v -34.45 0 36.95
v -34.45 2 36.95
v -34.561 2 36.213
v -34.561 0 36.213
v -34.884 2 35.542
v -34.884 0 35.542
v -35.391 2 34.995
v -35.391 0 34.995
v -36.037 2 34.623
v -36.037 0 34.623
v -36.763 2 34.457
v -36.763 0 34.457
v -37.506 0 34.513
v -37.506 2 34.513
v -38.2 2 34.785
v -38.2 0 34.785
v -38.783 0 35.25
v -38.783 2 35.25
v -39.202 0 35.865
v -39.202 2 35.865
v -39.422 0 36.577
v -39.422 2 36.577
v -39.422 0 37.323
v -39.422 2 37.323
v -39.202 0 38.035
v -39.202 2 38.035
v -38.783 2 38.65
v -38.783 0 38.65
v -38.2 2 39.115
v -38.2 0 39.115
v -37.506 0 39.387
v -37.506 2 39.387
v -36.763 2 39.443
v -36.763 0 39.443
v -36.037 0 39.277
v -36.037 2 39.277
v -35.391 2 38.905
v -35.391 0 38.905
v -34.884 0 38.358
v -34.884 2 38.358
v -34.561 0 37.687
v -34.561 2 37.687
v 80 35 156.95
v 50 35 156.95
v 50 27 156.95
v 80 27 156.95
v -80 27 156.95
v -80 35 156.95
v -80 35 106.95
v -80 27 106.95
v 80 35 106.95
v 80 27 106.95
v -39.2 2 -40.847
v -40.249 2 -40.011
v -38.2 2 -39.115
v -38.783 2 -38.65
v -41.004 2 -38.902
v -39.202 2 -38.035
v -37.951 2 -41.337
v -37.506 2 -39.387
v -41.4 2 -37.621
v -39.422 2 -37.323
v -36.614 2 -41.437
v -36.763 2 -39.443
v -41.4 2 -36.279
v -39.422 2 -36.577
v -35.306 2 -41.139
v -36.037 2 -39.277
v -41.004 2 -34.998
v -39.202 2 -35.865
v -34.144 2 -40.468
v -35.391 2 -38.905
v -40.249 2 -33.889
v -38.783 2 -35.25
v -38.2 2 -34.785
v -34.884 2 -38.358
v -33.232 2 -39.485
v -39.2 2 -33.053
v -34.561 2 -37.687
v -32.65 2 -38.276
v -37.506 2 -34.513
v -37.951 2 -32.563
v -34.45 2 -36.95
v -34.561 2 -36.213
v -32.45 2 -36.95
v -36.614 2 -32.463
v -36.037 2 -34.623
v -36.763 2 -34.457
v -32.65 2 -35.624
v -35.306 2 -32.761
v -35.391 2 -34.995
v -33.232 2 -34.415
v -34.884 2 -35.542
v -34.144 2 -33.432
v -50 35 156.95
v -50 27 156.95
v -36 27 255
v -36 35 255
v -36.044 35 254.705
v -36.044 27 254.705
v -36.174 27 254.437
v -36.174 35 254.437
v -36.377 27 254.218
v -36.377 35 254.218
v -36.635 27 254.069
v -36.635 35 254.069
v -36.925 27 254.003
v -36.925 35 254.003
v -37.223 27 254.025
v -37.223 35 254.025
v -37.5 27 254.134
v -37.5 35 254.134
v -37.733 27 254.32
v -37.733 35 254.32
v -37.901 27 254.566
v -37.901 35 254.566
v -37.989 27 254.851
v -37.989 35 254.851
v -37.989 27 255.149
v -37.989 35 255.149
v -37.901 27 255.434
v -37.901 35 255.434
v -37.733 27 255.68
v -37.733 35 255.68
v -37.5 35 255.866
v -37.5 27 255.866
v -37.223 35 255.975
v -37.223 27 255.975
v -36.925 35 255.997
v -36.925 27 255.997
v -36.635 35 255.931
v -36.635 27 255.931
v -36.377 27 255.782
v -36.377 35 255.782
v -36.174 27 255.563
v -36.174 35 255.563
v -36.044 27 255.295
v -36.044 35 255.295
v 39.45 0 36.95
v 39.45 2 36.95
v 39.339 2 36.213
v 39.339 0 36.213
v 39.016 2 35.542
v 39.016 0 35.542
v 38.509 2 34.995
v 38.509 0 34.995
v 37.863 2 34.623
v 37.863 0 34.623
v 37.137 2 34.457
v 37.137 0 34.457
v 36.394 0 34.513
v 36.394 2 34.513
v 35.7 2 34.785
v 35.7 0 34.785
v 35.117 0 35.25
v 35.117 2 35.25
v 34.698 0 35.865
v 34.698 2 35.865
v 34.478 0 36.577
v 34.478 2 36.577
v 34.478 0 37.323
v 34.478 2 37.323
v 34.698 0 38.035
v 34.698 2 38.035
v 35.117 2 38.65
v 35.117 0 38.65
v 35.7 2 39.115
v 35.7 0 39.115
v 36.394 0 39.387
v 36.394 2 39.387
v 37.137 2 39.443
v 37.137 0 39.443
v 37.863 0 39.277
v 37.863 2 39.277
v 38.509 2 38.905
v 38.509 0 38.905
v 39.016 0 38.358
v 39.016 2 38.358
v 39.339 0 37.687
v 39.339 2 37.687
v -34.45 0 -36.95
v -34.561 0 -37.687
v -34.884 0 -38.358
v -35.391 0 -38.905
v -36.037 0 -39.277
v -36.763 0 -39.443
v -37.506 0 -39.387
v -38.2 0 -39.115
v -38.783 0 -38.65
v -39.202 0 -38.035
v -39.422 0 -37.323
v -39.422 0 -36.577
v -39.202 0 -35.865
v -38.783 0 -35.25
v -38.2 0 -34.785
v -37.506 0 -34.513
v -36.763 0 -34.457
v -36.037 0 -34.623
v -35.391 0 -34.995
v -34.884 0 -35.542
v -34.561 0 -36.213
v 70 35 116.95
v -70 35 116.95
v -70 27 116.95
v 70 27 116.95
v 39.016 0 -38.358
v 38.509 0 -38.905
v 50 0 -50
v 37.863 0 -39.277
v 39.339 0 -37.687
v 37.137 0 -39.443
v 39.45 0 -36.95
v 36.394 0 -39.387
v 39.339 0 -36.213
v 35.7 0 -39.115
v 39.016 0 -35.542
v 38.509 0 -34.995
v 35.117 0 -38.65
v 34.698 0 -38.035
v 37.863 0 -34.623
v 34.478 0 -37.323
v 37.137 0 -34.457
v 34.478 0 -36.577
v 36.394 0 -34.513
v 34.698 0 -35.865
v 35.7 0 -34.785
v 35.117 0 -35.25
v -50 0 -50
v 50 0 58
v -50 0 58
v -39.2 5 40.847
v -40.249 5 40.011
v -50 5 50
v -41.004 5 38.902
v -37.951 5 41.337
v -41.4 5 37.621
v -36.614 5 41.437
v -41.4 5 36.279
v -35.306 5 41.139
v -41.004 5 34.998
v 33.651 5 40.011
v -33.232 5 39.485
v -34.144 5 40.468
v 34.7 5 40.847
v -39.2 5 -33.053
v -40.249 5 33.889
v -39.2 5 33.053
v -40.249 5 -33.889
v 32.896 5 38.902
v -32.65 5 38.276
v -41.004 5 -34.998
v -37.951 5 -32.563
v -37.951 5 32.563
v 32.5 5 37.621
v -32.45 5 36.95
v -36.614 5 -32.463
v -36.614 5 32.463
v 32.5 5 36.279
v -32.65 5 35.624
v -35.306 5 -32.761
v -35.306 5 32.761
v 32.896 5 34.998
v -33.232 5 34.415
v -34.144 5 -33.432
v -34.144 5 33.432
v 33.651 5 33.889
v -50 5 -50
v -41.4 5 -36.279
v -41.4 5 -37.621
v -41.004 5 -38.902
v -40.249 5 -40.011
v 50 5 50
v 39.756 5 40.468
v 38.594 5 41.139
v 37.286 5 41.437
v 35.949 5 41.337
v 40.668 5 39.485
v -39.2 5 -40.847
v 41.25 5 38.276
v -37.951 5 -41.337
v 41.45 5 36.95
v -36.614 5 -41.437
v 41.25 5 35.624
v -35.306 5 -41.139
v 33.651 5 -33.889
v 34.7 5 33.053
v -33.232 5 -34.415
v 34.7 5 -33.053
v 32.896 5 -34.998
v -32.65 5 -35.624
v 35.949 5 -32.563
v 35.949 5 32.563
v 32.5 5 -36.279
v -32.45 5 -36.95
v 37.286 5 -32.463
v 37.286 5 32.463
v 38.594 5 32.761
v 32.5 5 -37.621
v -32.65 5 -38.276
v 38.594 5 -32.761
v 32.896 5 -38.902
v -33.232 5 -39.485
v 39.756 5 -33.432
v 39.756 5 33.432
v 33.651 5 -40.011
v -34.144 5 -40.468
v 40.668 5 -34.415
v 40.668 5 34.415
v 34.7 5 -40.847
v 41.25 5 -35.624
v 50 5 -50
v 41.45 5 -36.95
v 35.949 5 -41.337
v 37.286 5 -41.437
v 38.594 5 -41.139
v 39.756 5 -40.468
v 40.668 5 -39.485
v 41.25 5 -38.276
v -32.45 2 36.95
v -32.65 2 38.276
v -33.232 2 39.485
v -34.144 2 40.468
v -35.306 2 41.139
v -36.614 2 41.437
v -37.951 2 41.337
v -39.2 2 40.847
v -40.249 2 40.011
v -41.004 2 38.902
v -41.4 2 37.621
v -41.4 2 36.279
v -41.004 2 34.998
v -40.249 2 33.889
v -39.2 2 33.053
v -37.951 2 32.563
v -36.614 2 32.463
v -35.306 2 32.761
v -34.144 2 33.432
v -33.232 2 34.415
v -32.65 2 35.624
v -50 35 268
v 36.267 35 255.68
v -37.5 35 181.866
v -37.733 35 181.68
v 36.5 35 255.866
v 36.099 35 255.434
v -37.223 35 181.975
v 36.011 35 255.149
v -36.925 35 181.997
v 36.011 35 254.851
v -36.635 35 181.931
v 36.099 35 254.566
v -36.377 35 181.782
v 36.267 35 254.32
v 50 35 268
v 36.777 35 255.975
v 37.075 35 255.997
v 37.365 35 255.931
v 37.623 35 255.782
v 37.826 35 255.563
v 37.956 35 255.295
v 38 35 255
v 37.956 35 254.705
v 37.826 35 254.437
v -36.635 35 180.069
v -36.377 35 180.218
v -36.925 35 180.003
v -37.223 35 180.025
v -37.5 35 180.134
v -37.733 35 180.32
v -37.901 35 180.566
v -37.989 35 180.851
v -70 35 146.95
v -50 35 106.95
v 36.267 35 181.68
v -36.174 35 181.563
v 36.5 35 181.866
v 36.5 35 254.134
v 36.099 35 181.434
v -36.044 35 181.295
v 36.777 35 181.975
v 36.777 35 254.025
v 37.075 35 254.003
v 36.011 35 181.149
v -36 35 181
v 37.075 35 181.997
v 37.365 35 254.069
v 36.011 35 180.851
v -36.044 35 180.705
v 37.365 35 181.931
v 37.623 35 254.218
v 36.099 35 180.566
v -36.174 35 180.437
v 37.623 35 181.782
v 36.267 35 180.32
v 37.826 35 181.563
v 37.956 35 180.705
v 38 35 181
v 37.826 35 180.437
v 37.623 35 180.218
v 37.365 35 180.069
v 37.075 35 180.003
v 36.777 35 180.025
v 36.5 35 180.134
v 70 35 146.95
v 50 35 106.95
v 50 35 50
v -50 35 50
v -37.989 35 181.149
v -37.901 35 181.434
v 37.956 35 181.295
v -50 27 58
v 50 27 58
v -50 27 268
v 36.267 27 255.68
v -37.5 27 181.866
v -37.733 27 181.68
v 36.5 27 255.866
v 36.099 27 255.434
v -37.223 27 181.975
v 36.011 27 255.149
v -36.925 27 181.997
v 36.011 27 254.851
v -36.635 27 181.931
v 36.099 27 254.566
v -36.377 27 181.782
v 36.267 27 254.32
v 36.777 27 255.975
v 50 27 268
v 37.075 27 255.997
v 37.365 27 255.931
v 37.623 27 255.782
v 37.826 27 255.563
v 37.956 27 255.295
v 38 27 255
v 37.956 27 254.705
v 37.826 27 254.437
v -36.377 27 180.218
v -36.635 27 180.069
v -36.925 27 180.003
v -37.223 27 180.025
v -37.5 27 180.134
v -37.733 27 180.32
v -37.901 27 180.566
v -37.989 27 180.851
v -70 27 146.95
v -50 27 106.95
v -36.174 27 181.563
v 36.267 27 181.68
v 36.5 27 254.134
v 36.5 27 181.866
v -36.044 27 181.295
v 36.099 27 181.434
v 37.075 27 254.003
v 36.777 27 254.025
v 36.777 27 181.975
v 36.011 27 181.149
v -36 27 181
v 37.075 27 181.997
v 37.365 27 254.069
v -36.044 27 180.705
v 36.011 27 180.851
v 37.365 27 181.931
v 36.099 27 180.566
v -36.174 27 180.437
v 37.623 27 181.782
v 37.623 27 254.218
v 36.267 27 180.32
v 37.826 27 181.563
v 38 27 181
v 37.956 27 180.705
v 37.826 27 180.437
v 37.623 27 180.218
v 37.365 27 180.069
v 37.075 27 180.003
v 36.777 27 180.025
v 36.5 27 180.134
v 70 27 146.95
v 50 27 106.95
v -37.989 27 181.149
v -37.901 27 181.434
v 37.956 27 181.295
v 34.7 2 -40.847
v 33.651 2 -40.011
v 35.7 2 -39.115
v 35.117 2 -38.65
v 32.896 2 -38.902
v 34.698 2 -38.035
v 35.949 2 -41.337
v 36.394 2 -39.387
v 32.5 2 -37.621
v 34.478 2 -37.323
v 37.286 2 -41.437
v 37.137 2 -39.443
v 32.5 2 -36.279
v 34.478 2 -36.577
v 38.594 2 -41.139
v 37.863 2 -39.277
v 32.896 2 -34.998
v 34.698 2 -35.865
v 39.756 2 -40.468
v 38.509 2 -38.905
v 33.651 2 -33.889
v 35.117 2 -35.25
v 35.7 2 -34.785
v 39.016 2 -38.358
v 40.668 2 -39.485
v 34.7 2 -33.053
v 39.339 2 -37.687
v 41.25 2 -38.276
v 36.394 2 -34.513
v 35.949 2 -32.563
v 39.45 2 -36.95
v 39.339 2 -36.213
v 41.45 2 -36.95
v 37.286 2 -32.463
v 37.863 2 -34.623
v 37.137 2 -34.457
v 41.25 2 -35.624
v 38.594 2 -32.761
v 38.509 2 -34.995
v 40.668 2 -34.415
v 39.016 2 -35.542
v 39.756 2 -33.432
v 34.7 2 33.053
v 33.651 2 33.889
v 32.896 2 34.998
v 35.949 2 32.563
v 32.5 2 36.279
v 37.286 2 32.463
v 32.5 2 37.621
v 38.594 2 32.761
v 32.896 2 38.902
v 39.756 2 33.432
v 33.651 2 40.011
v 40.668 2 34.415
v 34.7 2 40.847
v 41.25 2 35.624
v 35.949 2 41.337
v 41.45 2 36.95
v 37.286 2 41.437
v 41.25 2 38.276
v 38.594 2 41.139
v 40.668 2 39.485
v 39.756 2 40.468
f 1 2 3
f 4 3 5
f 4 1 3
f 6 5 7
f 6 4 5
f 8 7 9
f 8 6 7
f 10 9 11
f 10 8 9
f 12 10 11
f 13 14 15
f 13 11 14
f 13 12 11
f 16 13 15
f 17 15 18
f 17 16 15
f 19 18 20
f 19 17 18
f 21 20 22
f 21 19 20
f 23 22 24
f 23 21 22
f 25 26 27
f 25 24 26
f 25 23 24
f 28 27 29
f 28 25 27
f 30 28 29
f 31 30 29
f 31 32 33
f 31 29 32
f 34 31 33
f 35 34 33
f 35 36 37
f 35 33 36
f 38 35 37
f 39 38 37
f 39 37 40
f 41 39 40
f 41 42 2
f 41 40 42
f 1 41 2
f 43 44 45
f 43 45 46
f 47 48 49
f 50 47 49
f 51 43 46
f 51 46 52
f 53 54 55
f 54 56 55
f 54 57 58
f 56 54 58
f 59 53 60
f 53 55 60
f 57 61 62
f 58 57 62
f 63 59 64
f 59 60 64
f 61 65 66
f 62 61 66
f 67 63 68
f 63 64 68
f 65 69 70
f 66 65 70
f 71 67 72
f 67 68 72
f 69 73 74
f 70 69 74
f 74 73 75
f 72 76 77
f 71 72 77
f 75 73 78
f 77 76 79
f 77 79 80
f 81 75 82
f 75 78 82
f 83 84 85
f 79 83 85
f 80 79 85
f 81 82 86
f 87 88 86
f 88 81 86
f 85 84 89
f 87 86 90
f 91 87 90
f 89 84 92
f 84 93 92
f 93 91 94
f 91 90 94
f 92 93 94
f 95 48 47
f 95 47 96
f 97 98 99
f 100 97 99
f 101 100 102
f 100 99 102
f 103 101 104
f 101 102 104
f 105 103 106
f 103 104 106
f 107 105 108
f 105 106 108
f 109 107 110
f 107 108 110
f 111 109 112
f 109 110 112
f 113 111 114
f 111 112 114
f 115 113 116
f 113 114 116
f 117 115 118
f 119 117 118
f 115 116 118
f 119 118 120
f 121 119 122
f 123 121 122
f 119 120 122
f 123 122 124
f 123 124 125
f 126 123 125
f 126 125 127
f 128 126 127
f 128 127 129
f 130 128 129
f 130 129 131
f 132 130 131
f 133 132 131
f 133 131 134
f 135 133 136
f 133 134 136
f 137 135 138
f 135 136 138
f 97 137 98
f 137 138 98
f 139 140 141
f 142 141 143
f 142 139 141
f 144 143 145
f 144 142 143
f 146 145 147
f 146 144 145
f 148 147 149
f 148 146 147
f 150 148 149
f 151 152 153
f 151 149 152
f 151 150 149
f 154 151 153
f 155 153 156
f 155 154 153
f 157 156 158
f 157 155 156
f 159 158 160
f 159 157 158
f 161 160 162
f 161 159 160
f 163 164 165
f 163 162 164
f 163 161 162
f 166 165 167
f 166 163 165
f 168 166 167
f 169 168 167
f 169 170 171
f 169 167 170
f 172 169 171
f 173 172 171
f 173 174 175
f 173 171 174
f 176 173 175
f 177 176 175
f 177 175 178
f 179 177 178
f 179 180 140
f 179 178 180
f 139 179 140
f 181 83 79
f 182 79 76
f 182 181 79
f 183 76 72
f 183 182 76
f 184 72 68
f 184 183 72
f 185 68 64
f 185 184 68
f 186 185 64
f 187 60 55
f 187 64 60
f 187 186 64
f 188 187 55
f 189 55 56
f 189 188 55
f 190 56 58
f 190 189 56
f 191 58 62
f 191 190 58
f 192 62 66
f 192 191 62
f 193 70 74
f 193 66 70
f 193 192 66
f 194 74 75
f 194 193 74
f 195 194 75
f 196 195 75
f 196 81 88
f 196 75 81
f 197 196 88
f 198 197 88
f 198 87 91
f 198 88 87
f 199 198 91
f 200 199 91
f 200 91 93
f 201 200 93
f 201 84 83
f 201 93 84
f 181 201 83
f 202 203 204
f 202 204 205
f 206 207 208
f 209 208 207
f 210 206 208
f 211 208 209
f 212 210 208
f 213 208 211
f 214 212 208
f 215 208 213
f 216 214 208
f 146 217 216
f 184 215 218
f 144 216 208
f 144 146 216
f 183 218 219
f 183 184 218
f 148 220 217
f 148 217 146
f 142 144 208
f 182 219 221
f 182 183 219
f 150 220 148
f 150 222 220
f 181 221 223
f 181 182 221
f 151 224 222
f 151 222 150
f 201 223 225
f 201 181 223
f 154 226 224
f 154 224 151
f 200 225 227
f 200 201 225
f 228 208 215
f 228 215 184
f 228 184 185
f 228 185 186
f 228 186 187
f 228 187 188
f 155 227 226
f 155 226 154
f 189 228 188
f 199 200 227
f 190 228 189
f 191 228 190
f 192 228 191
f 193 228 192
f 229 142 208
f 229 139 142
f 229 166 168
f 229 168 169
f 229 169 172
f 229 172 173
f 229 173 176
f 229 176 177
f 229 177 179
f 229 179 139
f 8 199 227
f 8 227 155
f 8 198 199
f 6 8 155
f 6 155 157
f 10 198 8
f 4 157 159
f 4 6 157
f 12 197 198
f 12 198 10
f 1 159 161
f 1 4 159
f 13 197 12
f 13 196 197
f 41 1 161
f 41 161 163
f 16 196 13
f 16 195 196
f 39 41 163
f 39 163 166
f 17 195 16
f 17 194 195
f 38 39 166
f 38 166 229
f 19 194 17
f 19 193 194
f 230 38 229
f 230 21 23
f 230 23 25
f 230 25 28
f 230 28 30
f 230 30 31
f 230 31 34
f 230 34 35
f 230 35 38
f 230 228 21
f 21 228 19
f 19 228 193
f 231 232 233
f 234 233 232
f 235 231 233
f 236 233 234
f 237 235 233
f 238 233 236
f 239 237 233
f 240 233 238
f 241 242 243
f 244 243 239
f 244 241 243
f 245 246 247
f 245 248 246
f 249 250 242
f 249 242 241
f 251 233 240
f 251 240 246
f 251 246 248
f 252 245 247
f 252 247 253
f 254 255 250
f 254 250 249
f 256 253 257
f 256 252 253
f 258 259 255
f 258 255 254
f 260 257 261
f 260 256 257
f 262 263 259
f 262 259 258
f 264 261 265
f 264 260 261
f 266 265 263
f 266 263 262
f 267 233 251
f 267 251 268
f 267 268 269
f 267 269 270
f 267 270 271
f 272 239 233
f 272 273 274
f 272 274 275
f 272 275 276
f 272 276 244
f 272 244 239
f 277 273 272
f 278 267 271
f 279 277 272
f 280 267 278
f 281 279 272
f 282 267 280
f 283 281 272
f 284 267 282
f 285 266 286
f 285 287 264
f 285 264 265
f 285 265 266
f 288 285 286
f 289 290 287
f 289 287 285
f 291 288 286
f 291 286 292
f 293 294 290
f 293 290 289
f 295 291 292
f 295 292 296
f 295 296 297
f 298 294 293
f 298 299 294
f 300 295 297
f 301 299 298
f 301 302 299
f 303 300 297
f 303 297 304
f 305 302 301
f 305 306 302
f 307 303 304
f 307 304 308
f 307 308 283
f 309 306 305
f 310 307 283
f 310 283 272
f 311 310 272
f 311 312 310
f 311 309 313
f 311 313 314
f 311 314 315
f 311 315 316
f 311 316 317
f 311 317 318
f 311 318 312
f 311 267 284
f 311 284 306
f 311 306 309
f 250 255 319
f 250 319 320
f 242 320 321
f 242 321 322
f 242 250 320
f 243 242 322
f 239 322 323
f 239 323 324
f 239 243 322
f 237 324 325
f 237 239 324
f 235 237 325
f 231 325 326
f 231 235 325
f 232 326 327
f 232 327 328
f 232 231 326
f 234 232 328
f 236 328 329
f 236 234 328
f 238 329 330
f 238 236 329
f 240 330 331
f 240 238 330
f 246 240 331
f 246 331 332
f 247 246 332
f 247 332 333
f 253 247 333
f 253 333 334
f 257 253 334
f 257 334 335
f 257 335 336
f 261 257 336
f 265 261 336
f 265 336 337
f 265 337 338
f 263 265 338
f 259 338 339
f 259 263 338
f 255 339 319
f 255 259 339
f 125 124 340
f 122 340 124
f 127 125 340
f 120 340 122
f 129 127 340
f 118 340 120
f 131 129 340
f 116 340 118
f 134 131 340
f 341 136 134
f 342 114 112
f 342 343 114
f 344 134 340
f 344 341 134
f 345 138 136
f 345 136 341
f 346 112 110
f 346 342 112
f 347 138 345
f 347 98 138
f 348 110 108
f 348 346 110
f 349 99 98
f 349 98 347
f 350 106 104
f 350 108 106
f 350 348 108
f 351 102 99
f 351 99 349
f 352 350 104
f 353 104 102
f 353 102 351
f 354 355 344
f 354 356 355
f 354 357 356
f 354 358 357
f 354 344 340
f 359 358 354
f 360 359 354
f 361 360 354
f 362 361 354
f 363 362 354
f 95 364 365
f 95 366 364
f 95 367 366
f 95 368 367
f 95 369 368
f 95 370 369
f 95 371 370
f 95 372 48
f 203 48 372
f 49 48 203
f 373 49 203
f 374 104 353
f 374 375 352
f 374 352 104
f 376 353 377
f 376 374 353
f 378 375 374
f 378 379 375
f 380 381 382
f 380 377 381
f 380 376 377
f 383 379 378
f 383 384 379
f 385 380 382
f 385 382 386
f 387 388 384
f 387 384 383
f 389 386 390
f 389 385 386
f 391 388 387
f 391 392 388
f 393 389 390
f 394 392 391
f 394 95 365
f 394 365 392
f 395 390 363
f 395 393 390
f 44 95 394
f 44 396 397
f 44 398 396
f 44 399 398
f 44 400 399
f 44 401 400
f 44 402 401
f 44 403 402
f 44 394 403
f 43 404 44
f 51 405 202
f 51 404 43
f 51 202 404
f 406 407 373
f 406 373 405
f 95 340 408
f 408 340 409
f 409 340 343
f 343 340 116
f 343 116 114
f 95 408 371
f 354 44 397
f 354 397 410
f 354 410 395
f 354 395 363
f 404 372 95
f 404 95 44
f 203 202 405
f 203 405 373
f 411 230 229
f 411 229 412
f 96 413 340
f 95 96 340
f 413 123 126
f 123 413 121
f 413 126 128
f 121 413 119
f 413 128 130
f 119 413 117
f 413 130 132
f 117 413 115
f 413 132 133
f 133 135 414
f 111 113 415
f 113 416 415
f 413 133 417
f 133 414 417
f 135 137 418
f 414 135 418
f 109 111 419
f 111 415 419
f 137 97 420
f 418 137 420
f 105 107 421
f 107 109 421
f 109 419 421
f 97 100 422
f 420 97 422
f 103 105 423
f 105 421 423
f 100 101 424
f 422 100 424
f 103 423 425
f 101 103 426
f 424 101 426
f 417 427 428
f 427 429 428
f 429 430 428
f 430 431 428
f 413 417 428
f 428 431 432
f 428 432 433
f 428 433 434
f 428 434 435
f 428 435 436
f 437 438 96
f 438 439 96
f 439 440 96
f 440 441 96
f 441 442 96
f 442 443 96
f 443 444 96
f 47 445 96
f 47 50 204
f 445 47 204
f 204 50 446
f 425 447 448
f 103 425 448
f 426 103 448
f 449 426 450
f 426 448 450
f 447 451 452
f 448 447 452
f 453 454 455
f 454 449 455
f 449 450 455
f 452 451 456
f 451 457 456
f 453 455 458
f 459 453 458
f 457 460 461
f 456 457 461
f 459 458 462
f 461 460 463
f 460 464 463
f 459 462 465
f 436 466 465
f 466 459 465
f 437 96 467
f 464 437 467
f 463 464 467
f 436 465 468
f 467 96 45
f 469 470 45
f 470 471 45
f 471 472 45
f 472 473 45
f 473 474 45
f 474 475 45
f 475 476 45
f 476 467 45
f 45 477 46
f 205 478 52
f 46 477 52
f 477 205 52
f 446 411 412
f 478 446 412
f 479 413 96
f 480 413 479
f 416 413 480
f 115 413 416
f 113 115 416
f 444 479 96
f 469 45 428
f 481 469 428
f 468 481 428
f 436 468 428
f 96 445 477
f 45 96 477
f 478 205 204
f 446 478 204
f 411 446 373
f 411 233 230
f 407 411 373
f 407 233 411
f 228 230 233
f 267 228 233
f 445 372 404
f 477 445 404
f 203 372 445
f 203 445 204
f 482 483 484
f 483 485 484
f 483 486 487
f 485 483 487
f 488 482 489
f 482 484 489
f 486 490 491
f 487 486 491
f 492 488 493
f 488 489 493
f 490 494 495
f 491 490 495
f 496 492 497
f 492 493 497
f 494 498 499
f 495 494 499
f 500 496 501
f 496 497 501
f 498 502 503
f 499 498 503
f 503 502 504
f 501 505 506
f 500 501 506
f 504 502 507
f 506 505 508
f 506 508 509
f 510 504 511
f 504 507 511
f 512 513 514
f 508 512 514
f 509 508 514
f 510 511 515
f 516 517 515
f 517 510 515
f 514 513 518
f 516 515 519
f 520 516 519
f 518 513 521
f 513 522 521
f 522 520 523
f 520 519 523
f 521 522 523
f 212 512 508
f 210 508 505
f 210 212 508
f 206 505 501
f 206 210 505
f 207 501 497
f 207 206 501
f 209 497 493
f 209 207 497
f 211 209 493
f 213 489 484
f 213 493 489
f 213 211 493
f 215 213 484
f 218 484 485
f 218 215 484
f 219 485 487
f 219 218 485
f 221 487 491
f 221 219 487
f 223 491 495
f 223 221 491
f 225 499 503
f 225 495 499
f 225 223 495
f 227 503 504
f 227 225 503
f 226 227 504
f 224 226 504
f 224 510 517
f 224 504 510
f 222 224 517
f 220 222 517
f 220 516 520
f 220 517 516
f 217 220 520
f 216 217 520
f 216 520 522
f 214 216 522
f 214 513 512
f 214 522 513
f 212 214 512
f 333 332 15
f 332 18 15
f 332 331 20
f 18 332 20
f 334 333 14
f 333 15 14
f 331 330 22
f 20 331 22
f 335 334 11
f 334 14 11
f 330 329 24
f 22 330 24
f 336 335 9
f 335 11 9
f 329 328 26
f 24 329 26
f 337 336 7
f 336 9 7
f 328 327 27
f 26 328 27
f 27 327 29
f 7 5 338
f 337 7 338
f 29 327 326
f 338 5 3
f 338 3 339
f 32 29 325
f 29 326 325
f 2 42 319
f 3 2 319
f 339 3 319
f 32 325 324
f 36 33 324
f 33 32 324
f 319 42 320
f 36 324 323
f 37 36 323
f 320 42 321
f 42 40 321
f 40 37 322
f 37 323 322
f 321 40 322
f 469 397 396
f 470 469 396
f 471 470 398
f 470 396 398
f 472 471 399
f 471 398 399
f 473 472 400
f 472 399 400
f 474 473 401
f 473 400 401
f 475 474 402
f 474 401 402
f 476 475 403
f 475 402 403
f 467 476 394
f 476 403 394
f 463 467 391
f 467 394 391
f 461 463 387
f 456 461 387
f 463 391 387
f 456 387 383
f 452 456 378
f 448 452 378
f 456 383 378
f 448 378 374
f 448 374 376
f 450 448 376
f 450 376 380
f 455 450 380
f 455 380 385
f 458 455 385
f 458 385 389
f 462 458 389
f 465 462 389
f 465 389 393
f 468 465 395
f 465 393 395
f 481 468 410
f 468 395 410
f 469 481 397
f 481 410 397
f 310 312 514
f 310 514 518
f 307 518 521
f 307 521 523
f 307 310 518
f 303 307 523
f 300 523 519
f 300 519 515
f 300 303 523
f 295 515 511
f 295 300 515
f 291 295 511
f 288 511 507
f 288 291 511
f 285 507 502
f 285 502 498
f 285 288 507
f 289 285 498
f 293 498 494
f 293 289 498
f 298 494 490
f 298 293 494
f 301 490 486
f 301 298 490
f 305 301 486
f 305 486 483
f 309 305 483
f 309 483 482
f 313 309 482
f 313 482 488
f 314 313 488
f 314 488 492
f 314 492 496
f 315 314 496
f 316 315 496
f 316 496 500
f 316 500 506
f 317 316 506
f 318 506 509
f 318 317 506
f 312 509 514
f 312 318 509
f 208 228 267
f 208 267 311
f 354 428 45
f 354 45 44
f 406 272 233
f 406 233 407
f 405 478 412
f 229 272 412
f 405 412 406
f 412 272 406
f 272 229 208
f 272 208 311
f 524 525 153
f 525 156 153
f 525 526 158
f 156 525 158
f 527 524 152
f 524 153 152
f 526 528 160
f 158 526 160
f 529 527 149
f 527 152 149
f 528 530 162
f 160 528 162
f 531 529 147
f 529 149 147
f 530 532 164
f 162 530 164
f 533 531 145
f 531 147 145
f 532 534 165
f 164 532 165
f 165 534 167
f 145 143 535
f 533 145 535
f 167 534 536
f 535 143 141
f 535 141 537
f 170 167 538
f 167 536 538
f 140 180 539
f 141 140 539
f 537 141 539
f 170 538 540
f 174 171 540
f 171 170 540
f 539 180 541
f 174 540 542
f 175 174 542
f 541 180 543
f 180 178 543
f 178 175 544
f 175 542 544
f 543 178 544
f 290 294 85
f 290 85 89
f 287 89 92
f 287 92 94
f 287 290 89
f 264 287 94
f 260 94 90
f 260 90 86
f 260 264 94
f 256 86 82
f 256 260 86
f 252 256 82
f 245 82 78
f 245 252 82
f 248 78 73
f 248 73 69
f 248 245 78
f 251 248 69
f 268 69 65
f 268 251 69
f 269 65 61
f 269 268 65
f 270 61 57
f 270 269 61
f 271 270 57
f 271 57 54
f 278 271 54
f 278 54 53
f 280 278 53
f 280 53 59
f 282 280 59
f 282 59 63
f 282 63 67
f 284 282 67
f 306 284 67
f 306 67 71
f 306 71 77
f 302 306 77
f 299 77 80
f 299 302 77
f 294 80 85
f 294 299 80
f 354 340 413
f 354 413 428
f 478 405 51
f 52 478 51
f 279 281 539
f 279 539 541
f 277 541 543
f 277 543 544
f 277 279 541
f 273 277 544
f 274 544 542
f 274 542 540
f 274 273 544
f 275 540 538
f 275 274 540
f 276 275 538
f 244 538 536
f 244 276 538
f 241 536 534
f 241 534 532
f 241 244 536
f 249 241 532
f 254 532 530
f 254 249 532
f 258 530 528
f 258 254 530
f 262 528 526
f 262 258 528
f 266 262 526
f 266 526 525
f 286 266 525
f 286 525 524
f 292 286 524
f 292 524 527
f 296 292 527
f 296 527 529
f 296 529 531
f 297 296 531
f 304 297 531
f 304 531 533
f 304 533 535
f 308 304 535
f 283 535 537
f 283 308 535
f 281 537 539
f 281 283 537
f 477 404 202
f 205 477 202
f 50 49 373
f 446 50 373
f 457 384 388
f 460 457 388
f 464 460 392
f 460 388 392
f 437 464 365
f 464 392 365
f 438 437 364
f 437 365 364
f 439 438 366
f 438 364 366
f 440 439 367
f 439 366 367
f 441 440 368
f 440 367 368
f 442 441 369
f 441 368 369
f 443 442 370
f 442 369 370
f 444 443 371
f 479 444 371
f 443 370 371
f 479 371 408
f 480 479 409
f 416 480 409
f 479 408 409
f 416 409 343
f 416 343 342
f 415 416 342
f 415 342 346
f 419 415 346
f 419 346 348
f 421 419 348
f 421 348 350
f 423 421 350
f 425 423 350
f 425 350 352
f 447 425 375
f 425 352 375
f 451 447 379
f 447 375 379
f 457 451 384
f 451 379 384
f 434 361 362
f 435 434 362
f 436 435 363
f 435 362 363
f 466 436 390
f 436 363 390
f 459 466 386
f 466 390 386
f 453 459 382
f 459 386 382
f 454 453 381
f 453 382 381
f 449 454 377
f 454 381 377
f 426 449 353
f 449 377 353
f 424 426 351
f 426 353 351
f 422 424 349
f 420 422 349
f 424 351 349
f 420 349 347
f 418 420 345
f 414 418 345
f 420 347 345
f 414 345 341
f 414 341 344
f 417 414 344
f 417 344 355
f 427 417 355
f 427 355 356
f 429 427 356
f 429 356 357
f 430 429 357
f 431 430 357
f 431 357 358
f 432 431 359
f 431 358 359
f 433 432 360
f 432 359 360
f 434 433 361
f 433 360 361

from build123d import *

# Parameters (mm, degrees)
SKETCH1_W           = 100
SKETCH1_H           = 100
SKETCH1_R           = 2.5
BOSS_EXTRUDE1_DEPTH = 5
CUT_EXTRUDE1_START  = -5
SKETCH6_R           = 4.5
CUT_EXTRUDE1_DEPTH  = 3
SKETCH8_W           = 8
SKETCH8_H           = 35
BOSS_EXTRUDE2_DEPTH = 100
SKETCH9_W           = 100
SKETCH9_H           = 8
BOSS_EXTRUDE3_DEPTH = 210
SKETCH10_W          = 160
SKETCH10_H          = 50
BOSS_EXTRUDE4_DEPTH = 8
SKETCH11_W          = 140
SKETCH11_H          = 30
CUT_EXTRUDE2_DEPTH  = 8
SKETCH13_R          = 1
CUT_EXTRUDE3_DEPTH  = 8


with BuildPart() as part:
    # Sketch1 → Boss-Extrude1 (new body)
    with BuildSketch(Plane(origin=(0, 0, 0), x_dir=(1, 0, 0), z_dir=(0, 1, 0))):
        Rectangle(SKETCH1_W, SKETCH1_H)
        with Locations((-36.95, 36.95)):
            Circle(SKETCH1_R, mode=Mode.SUBTRACT)
        with Locations((36.95, 36.95)):
            Circle(SKETCH1_R, mode=Mode.SUBTRACT)
        with Locations((36.95, -36.95)):
            Circle(SKETCH1_R, mode=Mode.SUBTRACT)
        with Locations((-36.95, -36.95)):
            Circle(SKETCH1_R, mode=Mode.SUBTRACT)
    extrude(amount=BOSS_EXTRUDE1_DEPTH)

    # Sketch6 → Cut-Extrude1 (cut)
    with BuildSketch(Plane.XZ.offset(CUT_EXTRUDE1_START)):
        with Locations((-36.95, 36.95)):
            Circle(SKETCH6_R)
        with Locations((36.95, 36.95)):
            Circle(SKETCH6_R)
        with Locations((36.95, -36.95)):
            Circle(SKETCH6_R)
        with Locations((-36.95, -36.95)):
            Circle(SKETCH6_R)
    extrude(amount=CUT_EXTRUDE1_DEPTH, mode=Mode.SUBTRACT)

    # Sketch8 → Boss-Extrude2 (add, through all)
    with BuildSketch(Plane.ZY.offset(50)):
        with Locations((54, 17.5)):
            Rectangle(SKETCH8_W, SKETCH8_H)
    extrude(amount=-BOSS_EXTRUDE2_DEPTH)

    # Sketch9 → Boss-Extrude3 (add)
    with BuildSketch(Plane.XY.offset(58)):
        with Locations((0, 31)):
            Rectangle(SKETCH9_W, SKETCH9_H)
    extrude(amount=BOSS_EXTRUDE3_DEPTH)

    # Sketch10 → Boss-Extrude4 (add)
    with BuildSketch(Plane(origin=(0, 35, 0), x_dir=(1, 0, 0), z_dir=(0, 1, 0))):
        with Locations((0, -131.95)):
            Rectangle(SKETCH10_W, SKETCH10_H)
    extrude(amount=-BOSS_EXTRUDE4_DEPTH)

    # Sketch11 → Cut-Extrude2 (cut)
    with BuildSketch(Plane(origin=(0, 35, 0), x_dir=(1, 0, 0), z_dir=(0, 1, 0))):
        with Locations((0, -131.95)):
            Rectangle(SKETCH11_W, SKETCH11_H)
    extrude(amount=-CUT_EXTRUDE2_DEPTH, mode=Mode.SUBTRACT)

    # Sketch13 → Cut-Extrude3 (cut)
    with BuildSketch(Plane(origin=(0, 35, 0), x_dir=(1, 0, 0), z_dir=(0, 1, 0))):
        with Locations((-37, -181)):
            Circle(SKETCH13_R)
        with Locations((37, -181)):
            Circle(SKETCH13_R)
        with Locations((37, -255)):
            Circle(SKETCH13_R)
        with Locations((-37, -255)):
            Circle(SKETCH13_R)
    extrude(amount=-CUT_EXTRUDE3_DEPTH, mode=Mode.SUBTRACT)


solid = part.part
